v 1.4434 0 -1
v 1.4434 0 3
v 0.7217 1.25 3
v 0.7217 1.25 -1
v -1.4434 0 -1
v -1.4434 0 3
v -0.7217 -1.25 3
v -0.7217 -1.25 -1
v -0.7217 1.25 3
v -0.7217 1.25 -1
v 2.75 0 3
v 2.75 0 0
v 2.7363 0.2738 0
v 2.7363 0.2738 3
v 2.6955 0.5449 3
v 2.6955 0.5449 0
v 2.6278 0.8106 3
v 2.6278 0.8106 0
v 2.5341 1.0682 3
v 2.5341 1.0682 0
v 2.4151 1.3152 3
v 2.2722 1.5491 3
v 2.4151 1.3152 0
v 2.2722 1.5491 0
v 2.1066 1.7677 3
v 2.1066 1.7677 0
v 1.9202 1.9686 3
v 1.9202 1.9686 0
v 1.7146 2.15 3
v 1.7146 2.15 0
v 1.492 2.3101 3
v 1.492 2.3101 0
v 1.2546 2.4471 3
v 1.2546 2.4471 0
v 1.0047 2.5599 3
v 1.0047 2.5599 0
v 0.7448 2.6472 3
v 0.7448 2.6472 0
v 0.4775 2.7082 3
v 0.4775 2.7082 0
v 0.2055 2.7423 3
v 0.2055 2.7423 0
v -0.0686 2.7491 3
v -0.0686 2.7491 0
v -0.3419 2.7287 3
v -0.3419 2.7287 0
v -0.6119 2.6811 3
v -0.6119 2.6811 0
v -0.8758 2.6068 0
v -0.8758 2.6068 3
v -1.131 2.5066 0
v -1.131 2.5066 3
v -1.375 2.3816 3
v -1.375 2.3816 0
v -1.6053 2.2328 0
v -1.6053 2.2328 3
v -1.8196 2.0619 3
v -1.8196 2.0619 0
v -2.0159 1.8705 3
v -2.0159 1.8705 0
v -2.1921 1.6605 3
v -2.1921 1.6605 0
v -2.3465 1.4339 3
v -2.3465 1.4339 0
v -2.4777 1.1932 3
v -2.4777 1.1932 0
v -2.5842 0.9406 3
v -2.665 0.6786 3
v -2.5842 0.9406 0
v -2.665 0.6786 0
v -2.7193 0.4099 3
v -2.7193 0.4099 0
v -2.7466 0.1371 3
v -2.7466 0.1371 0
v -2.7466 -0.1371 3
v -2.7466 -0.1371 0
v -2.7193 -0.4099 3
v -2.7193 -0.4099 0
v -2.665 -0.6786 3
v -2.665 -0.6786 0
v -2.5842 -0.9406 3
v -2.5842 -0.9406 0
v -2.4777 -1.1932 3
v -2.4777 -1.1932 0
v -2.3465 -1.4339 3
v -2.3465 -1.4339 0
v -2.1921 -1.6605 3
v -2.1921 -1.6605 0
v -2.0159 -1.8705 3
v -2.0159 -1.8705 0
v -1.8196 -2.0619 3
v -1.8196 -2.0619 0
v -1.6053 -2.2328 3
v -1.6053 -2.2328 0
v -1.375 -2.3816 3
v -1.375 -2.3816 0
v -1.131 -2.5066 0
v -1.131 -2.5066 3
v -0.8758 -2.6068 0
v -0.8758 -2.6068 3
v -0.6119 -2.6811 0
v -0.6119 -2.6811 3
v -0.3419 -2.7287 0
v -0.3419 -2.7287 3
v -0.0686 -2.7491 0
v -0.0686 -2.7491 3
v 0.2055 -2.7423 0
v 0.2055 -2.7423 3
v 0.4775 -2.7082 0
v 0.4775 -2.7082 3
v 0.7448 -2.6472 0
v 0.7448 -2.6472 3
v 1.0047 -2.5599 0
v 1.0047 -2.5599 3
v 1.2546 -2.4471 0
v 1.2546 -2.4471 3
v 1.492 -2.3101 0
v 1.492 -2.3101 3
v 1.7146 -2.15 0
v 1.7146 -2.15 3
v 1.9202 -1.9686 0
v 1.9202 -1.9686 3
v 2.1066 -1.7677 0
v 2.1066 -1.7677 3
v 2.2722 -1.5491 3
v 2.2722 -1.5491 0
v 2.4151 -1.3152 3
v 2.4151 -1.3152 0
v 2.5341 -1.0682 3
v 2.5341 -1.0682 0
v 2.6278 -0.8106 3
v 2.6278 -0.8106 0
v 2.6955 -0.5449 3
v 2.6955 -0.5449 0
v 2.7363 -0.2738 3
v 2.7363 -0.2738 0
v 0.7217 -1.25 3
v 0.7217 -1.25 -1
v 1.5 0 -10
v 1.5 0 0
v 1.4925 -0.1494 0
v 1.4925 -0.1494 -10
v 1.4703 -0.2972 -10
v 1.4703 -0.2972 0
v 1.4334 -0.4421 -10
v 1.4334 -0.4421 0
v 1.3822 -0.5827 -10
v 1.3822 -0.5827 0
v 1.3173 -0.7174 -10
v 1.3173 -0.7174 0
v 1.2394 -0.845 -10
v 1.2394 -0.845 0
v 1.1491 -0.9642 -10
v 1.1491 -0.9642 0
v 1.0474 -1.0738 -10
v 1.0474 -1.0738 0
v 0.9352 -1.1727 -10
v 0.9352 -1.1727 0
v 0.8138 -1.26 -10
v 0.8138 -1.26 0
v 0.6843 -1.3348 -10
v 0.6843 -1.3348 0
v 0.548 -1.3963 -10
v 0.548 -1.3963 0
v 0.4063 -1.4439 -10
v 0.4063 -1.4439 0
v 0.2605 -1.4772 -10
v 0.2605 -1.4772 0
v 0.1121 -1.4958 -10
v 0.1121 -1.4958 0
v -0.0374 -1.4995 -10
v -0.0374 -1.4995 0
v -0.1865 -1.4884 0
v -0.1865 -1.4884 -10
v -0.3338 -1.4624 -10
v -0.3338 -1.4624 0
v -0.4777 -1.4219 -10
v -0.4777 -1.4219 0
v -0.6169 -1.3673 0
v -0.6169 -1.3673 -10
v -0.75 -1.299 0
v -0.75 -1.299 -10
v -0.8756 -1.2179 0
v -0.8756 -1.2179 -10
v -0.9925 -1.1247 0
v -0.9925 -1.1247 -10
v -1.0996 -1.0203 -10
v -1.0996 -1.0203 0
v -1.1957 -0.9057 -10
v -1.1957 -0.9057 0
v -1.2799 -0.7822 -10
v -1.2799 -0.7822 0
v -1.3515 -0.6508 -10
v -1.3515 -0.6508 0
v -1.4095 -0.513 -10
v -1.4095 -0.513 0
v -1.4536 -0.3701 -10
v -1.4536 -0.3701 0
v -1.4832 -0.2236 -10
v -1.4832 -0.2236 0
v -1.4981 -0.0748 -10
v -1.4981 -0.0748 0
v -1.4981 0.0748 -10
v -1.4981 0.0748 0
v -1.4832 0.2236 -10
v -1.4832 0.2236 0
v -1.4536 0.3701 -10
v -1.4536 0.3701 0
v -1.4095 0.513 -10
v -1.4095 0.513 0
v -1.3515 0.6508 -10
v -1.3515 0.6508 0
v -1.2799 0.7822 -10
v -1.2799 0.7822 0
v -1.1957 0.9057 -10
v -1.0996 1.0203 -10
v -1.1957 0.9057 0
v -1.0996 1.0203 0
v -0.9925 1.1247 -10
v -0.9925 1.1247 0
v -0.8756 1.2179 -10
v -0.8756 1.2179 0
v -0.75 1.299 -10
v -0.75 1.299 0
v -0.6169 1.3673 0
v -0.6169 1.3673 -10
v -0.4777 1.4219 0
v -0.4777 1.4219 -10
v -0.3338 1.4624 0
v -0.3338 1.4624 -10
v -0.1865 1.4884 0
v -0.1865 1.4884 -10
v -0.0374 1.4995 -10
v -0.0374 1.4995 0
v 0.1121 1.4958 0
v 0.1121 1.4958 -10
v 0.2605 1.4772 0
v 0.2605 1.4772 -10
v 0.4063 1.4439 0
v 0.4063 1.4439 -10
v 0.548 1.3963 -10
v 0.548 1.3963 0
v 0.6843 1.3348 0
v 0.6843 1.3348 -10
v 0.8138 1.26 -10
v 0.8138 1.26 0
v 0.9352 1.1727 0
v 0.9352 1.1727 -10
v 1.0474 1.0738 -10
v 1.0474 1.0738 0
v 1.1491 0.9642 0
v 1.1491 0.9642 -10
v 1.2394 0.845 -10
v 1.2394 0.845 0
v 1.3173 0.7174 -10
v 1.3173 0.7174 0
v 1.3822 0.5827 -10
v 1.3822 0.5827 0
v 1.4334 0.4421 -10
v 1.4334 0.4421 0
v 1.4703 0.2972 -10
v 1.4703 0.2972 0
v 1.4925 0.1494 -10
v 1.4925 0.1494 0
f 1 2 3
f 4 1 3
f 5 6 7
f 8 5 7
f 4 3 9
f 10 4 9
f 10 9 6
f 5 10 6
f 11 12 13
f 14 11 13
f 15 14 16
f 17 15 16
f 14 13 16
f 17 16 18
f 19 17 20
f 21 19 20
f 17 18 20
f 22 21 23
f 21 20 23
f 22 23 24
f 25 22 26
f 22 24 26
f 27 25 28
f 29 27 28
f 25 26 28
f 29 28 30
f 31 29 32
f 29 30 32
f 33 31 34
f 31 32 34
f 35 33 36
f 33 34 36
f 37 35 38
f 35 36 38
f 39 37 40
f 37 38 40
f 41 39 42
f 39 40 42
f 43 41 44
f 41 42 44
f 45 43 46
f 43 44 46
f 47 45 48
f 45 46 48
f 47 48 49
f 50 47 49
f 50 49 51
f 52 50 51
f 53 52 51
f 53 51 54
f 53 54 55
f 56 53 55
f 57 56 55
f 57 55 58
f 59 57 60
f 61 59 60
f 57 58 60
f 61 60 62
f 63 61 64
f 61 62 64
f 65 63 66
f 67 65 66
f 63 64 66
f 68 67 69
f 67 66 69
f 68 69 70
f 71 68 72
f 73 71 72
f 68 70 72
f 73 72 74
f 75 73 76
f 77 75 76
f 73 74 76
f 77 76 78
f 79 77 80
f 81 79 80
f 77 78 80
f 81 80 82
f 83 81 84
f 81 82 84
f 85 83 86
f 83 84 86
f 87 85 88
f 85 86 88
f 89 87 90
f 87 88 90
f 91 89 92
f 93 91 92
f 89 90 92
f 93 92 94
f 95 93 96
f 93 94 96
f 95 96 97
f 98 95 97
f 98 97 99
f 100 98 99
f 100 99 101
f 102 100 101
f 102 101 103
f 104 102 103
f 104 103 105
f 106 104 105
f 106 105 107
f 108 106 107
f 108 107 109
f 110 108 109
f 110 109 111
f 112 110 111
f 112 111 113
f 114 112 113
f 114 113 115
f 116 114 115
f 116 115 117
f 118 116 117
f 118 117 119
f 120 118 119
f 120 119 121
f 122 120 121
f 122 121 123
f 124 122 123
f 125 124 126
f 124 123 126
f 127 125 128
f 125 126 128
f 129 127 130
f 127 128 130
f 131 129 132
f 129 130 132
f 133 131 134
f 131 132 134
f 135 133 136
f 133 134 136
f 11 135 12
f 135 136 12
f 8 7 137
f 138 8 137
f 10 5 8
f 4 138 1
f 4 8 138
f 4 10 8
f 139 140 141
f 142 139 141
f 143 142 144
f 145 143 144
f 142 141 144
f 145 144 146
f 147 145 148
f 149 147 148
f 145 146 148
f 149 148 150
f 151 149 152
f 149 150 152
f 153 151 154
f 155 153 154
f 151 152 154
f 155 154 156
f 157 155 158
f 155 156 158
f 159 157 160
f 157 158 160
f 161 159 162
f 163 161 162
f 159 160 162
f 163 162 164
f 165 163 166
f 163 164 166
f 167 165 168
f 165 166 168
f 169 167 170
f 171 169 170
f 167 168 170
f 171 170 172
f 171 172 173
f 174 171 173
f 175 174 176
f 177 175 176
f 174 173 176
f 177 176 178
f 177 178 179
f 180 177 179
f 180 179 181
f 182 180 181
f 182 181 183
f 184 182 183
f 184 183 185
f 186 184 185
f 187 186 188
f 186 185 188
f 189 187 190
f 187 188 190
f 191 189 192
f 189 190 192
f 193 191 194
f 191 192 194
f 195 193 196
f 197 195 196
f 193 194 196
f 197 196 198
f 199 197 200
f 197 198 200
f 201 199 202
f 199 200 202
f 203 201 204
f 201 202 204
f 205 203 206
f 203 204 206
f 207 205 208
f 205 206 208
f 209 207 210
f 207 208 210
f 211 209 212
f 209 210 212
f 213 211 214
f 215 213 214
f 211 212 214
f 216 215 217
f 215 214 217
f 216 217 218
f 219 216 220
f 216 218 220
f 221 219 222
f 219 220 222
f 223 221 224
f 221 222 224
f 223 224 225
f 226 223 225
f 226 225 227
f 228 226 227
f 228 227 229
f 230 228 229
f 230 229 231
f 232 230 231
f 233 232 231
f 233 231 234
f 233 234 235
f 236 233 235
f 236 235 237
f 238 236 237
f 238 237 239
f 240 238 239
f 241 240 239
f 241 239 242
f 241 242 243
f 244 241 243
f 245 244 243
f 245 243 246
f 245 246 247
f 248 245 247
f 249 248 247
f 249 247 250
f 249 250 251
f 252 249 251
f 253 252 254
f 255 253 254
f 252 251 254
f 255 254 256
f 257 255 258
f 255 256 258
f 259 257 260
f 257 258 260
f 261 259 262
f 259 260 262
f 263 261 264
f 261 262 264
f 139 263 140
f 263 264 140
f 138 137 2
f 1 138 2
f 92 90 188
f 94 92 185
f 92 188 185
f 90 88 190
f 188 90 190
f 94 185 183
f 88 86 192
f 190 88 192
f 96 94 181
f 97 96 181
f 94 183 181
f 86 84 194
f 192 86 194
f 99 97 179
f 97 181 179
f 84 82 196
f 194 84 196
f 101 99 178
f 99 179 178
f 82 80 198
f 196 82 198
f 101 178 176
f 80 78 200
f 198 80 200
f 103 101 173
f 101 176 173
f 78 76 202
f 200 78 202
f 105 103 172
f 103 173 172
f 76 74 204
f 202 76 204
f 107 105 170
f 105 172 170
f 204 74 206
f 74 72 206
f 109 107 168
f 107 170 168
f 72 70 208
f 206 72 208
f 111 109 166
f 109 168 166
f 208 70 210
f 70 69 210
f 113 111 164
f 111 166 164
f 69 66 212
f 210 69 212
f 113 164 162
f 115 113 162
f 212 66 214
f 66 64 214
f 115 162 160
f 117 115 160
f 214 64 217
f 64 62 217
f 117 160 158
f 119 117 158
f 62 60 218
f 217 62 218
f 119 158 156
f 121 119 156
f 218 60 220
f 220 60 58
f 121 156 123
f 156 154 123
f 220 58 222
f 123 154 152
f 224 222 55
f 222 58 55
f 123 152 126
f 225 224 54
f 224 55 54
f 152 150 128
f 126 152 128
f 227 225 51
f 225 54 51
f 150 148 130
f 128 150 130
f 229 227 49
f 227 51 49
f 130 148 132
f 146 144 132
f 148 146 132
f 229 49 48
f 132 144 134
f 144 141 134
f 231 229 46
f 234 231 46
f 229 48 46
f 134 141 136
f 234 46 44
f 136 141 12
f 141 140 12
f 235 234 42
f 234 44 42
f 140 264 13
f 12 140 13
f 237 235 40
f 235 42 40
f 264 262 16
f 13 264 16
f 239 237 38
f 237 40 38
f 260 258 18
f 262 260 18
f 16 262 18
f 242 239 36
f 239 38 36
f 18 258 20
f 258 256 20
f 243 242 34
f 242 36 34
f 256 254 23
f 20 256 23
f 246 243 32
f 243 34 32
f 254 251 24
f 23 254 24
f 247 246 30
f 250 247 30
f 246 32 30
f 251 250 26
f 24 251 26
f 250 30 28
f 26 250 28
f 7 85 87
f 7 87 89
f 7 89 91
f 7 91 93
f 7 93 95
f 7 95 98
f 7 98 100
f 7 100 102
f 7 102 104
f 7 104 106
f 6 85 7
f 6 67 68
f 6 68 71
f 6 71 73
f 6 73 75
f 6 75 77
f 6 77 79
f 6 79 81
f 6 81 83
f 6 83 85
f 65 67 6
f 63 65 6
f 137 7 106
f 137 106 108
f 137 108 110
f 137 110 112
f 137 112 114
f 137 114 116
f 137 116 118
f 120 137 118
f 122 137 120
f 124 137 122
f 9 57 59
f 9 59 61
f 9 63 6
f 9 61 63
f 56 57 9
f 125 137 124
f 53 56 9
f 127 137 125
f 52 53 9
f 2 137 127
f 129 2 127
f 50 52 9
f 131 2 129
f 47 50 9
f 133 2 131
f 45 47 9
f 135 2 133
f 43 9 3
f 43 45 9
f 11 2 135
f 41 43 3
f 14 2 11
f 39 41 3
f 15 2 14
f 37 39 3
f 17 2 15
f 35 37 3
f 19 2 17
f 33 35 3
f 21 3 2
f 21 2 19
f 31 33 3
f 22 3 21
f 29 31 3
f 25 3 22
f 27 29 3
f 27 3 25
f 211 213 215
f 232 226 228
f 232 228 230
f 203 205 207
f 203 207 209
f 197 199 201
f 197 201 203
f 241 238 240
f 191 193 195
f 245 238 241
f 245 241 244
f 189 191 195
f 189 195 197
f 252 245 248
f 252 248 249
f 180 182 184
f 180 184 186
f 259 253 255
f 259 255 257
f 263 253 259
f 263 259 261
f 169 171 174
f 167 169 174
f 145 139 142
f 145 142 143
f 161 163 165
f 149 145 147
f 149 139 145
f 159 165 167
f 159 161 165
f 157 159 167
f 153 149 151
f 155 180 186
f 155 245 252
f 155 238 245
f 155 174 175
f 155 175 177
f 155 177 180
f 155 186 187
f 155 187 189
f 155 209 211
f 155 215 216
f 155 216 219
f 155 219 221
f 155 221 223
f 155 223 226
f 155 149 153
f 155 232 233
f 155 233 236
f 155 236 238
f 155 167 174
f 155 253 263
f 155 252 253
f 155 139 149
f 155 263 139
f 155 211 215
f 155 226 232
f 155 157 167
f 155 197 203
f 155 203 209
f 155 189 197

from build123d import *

# Parameters (mm, degrees)
SKETCH012_R     = 2.75
PAD007_DEPTH    = 3
SKETCH013_R     = 1.5
PAD008_DEPTH    = 10
POCKET004_DEPTH = 4


with BuildPart() as part:
    # Sketch012 → Pad007 (new body)
    with BuildSketch(Plane.XY):
        Circle(SKETCH012_R)
    extrude(amount=PAD007_DEPTH)

    # Sketch013 (on Face2 of Pad007) → Pad008 (join)
    with BuildSketch(Plane(origin=(0, 0, 0), x_dir=(1, 0, 0), z_dir=(0, 0, -1))):
        Circle(SKETCH013_R)
    extrude(amount=PAD008_DEPTH)

    # Sketch014 (on DatumPlane) → Pocket004 (cut)
    with BuildSketch(Plane.XY.offset(3)):
        Polygon((0.721688, -1.25), (1.443376, 0), (0.721688, 1.25), (-0.721688, 1.25), (-1.443376, 0), (-0.721688, -1.25), align=None)
    extrude(amount=-POCKET004_DEPTH, mode=Mode.SUBTRACT)


solid = part.part
